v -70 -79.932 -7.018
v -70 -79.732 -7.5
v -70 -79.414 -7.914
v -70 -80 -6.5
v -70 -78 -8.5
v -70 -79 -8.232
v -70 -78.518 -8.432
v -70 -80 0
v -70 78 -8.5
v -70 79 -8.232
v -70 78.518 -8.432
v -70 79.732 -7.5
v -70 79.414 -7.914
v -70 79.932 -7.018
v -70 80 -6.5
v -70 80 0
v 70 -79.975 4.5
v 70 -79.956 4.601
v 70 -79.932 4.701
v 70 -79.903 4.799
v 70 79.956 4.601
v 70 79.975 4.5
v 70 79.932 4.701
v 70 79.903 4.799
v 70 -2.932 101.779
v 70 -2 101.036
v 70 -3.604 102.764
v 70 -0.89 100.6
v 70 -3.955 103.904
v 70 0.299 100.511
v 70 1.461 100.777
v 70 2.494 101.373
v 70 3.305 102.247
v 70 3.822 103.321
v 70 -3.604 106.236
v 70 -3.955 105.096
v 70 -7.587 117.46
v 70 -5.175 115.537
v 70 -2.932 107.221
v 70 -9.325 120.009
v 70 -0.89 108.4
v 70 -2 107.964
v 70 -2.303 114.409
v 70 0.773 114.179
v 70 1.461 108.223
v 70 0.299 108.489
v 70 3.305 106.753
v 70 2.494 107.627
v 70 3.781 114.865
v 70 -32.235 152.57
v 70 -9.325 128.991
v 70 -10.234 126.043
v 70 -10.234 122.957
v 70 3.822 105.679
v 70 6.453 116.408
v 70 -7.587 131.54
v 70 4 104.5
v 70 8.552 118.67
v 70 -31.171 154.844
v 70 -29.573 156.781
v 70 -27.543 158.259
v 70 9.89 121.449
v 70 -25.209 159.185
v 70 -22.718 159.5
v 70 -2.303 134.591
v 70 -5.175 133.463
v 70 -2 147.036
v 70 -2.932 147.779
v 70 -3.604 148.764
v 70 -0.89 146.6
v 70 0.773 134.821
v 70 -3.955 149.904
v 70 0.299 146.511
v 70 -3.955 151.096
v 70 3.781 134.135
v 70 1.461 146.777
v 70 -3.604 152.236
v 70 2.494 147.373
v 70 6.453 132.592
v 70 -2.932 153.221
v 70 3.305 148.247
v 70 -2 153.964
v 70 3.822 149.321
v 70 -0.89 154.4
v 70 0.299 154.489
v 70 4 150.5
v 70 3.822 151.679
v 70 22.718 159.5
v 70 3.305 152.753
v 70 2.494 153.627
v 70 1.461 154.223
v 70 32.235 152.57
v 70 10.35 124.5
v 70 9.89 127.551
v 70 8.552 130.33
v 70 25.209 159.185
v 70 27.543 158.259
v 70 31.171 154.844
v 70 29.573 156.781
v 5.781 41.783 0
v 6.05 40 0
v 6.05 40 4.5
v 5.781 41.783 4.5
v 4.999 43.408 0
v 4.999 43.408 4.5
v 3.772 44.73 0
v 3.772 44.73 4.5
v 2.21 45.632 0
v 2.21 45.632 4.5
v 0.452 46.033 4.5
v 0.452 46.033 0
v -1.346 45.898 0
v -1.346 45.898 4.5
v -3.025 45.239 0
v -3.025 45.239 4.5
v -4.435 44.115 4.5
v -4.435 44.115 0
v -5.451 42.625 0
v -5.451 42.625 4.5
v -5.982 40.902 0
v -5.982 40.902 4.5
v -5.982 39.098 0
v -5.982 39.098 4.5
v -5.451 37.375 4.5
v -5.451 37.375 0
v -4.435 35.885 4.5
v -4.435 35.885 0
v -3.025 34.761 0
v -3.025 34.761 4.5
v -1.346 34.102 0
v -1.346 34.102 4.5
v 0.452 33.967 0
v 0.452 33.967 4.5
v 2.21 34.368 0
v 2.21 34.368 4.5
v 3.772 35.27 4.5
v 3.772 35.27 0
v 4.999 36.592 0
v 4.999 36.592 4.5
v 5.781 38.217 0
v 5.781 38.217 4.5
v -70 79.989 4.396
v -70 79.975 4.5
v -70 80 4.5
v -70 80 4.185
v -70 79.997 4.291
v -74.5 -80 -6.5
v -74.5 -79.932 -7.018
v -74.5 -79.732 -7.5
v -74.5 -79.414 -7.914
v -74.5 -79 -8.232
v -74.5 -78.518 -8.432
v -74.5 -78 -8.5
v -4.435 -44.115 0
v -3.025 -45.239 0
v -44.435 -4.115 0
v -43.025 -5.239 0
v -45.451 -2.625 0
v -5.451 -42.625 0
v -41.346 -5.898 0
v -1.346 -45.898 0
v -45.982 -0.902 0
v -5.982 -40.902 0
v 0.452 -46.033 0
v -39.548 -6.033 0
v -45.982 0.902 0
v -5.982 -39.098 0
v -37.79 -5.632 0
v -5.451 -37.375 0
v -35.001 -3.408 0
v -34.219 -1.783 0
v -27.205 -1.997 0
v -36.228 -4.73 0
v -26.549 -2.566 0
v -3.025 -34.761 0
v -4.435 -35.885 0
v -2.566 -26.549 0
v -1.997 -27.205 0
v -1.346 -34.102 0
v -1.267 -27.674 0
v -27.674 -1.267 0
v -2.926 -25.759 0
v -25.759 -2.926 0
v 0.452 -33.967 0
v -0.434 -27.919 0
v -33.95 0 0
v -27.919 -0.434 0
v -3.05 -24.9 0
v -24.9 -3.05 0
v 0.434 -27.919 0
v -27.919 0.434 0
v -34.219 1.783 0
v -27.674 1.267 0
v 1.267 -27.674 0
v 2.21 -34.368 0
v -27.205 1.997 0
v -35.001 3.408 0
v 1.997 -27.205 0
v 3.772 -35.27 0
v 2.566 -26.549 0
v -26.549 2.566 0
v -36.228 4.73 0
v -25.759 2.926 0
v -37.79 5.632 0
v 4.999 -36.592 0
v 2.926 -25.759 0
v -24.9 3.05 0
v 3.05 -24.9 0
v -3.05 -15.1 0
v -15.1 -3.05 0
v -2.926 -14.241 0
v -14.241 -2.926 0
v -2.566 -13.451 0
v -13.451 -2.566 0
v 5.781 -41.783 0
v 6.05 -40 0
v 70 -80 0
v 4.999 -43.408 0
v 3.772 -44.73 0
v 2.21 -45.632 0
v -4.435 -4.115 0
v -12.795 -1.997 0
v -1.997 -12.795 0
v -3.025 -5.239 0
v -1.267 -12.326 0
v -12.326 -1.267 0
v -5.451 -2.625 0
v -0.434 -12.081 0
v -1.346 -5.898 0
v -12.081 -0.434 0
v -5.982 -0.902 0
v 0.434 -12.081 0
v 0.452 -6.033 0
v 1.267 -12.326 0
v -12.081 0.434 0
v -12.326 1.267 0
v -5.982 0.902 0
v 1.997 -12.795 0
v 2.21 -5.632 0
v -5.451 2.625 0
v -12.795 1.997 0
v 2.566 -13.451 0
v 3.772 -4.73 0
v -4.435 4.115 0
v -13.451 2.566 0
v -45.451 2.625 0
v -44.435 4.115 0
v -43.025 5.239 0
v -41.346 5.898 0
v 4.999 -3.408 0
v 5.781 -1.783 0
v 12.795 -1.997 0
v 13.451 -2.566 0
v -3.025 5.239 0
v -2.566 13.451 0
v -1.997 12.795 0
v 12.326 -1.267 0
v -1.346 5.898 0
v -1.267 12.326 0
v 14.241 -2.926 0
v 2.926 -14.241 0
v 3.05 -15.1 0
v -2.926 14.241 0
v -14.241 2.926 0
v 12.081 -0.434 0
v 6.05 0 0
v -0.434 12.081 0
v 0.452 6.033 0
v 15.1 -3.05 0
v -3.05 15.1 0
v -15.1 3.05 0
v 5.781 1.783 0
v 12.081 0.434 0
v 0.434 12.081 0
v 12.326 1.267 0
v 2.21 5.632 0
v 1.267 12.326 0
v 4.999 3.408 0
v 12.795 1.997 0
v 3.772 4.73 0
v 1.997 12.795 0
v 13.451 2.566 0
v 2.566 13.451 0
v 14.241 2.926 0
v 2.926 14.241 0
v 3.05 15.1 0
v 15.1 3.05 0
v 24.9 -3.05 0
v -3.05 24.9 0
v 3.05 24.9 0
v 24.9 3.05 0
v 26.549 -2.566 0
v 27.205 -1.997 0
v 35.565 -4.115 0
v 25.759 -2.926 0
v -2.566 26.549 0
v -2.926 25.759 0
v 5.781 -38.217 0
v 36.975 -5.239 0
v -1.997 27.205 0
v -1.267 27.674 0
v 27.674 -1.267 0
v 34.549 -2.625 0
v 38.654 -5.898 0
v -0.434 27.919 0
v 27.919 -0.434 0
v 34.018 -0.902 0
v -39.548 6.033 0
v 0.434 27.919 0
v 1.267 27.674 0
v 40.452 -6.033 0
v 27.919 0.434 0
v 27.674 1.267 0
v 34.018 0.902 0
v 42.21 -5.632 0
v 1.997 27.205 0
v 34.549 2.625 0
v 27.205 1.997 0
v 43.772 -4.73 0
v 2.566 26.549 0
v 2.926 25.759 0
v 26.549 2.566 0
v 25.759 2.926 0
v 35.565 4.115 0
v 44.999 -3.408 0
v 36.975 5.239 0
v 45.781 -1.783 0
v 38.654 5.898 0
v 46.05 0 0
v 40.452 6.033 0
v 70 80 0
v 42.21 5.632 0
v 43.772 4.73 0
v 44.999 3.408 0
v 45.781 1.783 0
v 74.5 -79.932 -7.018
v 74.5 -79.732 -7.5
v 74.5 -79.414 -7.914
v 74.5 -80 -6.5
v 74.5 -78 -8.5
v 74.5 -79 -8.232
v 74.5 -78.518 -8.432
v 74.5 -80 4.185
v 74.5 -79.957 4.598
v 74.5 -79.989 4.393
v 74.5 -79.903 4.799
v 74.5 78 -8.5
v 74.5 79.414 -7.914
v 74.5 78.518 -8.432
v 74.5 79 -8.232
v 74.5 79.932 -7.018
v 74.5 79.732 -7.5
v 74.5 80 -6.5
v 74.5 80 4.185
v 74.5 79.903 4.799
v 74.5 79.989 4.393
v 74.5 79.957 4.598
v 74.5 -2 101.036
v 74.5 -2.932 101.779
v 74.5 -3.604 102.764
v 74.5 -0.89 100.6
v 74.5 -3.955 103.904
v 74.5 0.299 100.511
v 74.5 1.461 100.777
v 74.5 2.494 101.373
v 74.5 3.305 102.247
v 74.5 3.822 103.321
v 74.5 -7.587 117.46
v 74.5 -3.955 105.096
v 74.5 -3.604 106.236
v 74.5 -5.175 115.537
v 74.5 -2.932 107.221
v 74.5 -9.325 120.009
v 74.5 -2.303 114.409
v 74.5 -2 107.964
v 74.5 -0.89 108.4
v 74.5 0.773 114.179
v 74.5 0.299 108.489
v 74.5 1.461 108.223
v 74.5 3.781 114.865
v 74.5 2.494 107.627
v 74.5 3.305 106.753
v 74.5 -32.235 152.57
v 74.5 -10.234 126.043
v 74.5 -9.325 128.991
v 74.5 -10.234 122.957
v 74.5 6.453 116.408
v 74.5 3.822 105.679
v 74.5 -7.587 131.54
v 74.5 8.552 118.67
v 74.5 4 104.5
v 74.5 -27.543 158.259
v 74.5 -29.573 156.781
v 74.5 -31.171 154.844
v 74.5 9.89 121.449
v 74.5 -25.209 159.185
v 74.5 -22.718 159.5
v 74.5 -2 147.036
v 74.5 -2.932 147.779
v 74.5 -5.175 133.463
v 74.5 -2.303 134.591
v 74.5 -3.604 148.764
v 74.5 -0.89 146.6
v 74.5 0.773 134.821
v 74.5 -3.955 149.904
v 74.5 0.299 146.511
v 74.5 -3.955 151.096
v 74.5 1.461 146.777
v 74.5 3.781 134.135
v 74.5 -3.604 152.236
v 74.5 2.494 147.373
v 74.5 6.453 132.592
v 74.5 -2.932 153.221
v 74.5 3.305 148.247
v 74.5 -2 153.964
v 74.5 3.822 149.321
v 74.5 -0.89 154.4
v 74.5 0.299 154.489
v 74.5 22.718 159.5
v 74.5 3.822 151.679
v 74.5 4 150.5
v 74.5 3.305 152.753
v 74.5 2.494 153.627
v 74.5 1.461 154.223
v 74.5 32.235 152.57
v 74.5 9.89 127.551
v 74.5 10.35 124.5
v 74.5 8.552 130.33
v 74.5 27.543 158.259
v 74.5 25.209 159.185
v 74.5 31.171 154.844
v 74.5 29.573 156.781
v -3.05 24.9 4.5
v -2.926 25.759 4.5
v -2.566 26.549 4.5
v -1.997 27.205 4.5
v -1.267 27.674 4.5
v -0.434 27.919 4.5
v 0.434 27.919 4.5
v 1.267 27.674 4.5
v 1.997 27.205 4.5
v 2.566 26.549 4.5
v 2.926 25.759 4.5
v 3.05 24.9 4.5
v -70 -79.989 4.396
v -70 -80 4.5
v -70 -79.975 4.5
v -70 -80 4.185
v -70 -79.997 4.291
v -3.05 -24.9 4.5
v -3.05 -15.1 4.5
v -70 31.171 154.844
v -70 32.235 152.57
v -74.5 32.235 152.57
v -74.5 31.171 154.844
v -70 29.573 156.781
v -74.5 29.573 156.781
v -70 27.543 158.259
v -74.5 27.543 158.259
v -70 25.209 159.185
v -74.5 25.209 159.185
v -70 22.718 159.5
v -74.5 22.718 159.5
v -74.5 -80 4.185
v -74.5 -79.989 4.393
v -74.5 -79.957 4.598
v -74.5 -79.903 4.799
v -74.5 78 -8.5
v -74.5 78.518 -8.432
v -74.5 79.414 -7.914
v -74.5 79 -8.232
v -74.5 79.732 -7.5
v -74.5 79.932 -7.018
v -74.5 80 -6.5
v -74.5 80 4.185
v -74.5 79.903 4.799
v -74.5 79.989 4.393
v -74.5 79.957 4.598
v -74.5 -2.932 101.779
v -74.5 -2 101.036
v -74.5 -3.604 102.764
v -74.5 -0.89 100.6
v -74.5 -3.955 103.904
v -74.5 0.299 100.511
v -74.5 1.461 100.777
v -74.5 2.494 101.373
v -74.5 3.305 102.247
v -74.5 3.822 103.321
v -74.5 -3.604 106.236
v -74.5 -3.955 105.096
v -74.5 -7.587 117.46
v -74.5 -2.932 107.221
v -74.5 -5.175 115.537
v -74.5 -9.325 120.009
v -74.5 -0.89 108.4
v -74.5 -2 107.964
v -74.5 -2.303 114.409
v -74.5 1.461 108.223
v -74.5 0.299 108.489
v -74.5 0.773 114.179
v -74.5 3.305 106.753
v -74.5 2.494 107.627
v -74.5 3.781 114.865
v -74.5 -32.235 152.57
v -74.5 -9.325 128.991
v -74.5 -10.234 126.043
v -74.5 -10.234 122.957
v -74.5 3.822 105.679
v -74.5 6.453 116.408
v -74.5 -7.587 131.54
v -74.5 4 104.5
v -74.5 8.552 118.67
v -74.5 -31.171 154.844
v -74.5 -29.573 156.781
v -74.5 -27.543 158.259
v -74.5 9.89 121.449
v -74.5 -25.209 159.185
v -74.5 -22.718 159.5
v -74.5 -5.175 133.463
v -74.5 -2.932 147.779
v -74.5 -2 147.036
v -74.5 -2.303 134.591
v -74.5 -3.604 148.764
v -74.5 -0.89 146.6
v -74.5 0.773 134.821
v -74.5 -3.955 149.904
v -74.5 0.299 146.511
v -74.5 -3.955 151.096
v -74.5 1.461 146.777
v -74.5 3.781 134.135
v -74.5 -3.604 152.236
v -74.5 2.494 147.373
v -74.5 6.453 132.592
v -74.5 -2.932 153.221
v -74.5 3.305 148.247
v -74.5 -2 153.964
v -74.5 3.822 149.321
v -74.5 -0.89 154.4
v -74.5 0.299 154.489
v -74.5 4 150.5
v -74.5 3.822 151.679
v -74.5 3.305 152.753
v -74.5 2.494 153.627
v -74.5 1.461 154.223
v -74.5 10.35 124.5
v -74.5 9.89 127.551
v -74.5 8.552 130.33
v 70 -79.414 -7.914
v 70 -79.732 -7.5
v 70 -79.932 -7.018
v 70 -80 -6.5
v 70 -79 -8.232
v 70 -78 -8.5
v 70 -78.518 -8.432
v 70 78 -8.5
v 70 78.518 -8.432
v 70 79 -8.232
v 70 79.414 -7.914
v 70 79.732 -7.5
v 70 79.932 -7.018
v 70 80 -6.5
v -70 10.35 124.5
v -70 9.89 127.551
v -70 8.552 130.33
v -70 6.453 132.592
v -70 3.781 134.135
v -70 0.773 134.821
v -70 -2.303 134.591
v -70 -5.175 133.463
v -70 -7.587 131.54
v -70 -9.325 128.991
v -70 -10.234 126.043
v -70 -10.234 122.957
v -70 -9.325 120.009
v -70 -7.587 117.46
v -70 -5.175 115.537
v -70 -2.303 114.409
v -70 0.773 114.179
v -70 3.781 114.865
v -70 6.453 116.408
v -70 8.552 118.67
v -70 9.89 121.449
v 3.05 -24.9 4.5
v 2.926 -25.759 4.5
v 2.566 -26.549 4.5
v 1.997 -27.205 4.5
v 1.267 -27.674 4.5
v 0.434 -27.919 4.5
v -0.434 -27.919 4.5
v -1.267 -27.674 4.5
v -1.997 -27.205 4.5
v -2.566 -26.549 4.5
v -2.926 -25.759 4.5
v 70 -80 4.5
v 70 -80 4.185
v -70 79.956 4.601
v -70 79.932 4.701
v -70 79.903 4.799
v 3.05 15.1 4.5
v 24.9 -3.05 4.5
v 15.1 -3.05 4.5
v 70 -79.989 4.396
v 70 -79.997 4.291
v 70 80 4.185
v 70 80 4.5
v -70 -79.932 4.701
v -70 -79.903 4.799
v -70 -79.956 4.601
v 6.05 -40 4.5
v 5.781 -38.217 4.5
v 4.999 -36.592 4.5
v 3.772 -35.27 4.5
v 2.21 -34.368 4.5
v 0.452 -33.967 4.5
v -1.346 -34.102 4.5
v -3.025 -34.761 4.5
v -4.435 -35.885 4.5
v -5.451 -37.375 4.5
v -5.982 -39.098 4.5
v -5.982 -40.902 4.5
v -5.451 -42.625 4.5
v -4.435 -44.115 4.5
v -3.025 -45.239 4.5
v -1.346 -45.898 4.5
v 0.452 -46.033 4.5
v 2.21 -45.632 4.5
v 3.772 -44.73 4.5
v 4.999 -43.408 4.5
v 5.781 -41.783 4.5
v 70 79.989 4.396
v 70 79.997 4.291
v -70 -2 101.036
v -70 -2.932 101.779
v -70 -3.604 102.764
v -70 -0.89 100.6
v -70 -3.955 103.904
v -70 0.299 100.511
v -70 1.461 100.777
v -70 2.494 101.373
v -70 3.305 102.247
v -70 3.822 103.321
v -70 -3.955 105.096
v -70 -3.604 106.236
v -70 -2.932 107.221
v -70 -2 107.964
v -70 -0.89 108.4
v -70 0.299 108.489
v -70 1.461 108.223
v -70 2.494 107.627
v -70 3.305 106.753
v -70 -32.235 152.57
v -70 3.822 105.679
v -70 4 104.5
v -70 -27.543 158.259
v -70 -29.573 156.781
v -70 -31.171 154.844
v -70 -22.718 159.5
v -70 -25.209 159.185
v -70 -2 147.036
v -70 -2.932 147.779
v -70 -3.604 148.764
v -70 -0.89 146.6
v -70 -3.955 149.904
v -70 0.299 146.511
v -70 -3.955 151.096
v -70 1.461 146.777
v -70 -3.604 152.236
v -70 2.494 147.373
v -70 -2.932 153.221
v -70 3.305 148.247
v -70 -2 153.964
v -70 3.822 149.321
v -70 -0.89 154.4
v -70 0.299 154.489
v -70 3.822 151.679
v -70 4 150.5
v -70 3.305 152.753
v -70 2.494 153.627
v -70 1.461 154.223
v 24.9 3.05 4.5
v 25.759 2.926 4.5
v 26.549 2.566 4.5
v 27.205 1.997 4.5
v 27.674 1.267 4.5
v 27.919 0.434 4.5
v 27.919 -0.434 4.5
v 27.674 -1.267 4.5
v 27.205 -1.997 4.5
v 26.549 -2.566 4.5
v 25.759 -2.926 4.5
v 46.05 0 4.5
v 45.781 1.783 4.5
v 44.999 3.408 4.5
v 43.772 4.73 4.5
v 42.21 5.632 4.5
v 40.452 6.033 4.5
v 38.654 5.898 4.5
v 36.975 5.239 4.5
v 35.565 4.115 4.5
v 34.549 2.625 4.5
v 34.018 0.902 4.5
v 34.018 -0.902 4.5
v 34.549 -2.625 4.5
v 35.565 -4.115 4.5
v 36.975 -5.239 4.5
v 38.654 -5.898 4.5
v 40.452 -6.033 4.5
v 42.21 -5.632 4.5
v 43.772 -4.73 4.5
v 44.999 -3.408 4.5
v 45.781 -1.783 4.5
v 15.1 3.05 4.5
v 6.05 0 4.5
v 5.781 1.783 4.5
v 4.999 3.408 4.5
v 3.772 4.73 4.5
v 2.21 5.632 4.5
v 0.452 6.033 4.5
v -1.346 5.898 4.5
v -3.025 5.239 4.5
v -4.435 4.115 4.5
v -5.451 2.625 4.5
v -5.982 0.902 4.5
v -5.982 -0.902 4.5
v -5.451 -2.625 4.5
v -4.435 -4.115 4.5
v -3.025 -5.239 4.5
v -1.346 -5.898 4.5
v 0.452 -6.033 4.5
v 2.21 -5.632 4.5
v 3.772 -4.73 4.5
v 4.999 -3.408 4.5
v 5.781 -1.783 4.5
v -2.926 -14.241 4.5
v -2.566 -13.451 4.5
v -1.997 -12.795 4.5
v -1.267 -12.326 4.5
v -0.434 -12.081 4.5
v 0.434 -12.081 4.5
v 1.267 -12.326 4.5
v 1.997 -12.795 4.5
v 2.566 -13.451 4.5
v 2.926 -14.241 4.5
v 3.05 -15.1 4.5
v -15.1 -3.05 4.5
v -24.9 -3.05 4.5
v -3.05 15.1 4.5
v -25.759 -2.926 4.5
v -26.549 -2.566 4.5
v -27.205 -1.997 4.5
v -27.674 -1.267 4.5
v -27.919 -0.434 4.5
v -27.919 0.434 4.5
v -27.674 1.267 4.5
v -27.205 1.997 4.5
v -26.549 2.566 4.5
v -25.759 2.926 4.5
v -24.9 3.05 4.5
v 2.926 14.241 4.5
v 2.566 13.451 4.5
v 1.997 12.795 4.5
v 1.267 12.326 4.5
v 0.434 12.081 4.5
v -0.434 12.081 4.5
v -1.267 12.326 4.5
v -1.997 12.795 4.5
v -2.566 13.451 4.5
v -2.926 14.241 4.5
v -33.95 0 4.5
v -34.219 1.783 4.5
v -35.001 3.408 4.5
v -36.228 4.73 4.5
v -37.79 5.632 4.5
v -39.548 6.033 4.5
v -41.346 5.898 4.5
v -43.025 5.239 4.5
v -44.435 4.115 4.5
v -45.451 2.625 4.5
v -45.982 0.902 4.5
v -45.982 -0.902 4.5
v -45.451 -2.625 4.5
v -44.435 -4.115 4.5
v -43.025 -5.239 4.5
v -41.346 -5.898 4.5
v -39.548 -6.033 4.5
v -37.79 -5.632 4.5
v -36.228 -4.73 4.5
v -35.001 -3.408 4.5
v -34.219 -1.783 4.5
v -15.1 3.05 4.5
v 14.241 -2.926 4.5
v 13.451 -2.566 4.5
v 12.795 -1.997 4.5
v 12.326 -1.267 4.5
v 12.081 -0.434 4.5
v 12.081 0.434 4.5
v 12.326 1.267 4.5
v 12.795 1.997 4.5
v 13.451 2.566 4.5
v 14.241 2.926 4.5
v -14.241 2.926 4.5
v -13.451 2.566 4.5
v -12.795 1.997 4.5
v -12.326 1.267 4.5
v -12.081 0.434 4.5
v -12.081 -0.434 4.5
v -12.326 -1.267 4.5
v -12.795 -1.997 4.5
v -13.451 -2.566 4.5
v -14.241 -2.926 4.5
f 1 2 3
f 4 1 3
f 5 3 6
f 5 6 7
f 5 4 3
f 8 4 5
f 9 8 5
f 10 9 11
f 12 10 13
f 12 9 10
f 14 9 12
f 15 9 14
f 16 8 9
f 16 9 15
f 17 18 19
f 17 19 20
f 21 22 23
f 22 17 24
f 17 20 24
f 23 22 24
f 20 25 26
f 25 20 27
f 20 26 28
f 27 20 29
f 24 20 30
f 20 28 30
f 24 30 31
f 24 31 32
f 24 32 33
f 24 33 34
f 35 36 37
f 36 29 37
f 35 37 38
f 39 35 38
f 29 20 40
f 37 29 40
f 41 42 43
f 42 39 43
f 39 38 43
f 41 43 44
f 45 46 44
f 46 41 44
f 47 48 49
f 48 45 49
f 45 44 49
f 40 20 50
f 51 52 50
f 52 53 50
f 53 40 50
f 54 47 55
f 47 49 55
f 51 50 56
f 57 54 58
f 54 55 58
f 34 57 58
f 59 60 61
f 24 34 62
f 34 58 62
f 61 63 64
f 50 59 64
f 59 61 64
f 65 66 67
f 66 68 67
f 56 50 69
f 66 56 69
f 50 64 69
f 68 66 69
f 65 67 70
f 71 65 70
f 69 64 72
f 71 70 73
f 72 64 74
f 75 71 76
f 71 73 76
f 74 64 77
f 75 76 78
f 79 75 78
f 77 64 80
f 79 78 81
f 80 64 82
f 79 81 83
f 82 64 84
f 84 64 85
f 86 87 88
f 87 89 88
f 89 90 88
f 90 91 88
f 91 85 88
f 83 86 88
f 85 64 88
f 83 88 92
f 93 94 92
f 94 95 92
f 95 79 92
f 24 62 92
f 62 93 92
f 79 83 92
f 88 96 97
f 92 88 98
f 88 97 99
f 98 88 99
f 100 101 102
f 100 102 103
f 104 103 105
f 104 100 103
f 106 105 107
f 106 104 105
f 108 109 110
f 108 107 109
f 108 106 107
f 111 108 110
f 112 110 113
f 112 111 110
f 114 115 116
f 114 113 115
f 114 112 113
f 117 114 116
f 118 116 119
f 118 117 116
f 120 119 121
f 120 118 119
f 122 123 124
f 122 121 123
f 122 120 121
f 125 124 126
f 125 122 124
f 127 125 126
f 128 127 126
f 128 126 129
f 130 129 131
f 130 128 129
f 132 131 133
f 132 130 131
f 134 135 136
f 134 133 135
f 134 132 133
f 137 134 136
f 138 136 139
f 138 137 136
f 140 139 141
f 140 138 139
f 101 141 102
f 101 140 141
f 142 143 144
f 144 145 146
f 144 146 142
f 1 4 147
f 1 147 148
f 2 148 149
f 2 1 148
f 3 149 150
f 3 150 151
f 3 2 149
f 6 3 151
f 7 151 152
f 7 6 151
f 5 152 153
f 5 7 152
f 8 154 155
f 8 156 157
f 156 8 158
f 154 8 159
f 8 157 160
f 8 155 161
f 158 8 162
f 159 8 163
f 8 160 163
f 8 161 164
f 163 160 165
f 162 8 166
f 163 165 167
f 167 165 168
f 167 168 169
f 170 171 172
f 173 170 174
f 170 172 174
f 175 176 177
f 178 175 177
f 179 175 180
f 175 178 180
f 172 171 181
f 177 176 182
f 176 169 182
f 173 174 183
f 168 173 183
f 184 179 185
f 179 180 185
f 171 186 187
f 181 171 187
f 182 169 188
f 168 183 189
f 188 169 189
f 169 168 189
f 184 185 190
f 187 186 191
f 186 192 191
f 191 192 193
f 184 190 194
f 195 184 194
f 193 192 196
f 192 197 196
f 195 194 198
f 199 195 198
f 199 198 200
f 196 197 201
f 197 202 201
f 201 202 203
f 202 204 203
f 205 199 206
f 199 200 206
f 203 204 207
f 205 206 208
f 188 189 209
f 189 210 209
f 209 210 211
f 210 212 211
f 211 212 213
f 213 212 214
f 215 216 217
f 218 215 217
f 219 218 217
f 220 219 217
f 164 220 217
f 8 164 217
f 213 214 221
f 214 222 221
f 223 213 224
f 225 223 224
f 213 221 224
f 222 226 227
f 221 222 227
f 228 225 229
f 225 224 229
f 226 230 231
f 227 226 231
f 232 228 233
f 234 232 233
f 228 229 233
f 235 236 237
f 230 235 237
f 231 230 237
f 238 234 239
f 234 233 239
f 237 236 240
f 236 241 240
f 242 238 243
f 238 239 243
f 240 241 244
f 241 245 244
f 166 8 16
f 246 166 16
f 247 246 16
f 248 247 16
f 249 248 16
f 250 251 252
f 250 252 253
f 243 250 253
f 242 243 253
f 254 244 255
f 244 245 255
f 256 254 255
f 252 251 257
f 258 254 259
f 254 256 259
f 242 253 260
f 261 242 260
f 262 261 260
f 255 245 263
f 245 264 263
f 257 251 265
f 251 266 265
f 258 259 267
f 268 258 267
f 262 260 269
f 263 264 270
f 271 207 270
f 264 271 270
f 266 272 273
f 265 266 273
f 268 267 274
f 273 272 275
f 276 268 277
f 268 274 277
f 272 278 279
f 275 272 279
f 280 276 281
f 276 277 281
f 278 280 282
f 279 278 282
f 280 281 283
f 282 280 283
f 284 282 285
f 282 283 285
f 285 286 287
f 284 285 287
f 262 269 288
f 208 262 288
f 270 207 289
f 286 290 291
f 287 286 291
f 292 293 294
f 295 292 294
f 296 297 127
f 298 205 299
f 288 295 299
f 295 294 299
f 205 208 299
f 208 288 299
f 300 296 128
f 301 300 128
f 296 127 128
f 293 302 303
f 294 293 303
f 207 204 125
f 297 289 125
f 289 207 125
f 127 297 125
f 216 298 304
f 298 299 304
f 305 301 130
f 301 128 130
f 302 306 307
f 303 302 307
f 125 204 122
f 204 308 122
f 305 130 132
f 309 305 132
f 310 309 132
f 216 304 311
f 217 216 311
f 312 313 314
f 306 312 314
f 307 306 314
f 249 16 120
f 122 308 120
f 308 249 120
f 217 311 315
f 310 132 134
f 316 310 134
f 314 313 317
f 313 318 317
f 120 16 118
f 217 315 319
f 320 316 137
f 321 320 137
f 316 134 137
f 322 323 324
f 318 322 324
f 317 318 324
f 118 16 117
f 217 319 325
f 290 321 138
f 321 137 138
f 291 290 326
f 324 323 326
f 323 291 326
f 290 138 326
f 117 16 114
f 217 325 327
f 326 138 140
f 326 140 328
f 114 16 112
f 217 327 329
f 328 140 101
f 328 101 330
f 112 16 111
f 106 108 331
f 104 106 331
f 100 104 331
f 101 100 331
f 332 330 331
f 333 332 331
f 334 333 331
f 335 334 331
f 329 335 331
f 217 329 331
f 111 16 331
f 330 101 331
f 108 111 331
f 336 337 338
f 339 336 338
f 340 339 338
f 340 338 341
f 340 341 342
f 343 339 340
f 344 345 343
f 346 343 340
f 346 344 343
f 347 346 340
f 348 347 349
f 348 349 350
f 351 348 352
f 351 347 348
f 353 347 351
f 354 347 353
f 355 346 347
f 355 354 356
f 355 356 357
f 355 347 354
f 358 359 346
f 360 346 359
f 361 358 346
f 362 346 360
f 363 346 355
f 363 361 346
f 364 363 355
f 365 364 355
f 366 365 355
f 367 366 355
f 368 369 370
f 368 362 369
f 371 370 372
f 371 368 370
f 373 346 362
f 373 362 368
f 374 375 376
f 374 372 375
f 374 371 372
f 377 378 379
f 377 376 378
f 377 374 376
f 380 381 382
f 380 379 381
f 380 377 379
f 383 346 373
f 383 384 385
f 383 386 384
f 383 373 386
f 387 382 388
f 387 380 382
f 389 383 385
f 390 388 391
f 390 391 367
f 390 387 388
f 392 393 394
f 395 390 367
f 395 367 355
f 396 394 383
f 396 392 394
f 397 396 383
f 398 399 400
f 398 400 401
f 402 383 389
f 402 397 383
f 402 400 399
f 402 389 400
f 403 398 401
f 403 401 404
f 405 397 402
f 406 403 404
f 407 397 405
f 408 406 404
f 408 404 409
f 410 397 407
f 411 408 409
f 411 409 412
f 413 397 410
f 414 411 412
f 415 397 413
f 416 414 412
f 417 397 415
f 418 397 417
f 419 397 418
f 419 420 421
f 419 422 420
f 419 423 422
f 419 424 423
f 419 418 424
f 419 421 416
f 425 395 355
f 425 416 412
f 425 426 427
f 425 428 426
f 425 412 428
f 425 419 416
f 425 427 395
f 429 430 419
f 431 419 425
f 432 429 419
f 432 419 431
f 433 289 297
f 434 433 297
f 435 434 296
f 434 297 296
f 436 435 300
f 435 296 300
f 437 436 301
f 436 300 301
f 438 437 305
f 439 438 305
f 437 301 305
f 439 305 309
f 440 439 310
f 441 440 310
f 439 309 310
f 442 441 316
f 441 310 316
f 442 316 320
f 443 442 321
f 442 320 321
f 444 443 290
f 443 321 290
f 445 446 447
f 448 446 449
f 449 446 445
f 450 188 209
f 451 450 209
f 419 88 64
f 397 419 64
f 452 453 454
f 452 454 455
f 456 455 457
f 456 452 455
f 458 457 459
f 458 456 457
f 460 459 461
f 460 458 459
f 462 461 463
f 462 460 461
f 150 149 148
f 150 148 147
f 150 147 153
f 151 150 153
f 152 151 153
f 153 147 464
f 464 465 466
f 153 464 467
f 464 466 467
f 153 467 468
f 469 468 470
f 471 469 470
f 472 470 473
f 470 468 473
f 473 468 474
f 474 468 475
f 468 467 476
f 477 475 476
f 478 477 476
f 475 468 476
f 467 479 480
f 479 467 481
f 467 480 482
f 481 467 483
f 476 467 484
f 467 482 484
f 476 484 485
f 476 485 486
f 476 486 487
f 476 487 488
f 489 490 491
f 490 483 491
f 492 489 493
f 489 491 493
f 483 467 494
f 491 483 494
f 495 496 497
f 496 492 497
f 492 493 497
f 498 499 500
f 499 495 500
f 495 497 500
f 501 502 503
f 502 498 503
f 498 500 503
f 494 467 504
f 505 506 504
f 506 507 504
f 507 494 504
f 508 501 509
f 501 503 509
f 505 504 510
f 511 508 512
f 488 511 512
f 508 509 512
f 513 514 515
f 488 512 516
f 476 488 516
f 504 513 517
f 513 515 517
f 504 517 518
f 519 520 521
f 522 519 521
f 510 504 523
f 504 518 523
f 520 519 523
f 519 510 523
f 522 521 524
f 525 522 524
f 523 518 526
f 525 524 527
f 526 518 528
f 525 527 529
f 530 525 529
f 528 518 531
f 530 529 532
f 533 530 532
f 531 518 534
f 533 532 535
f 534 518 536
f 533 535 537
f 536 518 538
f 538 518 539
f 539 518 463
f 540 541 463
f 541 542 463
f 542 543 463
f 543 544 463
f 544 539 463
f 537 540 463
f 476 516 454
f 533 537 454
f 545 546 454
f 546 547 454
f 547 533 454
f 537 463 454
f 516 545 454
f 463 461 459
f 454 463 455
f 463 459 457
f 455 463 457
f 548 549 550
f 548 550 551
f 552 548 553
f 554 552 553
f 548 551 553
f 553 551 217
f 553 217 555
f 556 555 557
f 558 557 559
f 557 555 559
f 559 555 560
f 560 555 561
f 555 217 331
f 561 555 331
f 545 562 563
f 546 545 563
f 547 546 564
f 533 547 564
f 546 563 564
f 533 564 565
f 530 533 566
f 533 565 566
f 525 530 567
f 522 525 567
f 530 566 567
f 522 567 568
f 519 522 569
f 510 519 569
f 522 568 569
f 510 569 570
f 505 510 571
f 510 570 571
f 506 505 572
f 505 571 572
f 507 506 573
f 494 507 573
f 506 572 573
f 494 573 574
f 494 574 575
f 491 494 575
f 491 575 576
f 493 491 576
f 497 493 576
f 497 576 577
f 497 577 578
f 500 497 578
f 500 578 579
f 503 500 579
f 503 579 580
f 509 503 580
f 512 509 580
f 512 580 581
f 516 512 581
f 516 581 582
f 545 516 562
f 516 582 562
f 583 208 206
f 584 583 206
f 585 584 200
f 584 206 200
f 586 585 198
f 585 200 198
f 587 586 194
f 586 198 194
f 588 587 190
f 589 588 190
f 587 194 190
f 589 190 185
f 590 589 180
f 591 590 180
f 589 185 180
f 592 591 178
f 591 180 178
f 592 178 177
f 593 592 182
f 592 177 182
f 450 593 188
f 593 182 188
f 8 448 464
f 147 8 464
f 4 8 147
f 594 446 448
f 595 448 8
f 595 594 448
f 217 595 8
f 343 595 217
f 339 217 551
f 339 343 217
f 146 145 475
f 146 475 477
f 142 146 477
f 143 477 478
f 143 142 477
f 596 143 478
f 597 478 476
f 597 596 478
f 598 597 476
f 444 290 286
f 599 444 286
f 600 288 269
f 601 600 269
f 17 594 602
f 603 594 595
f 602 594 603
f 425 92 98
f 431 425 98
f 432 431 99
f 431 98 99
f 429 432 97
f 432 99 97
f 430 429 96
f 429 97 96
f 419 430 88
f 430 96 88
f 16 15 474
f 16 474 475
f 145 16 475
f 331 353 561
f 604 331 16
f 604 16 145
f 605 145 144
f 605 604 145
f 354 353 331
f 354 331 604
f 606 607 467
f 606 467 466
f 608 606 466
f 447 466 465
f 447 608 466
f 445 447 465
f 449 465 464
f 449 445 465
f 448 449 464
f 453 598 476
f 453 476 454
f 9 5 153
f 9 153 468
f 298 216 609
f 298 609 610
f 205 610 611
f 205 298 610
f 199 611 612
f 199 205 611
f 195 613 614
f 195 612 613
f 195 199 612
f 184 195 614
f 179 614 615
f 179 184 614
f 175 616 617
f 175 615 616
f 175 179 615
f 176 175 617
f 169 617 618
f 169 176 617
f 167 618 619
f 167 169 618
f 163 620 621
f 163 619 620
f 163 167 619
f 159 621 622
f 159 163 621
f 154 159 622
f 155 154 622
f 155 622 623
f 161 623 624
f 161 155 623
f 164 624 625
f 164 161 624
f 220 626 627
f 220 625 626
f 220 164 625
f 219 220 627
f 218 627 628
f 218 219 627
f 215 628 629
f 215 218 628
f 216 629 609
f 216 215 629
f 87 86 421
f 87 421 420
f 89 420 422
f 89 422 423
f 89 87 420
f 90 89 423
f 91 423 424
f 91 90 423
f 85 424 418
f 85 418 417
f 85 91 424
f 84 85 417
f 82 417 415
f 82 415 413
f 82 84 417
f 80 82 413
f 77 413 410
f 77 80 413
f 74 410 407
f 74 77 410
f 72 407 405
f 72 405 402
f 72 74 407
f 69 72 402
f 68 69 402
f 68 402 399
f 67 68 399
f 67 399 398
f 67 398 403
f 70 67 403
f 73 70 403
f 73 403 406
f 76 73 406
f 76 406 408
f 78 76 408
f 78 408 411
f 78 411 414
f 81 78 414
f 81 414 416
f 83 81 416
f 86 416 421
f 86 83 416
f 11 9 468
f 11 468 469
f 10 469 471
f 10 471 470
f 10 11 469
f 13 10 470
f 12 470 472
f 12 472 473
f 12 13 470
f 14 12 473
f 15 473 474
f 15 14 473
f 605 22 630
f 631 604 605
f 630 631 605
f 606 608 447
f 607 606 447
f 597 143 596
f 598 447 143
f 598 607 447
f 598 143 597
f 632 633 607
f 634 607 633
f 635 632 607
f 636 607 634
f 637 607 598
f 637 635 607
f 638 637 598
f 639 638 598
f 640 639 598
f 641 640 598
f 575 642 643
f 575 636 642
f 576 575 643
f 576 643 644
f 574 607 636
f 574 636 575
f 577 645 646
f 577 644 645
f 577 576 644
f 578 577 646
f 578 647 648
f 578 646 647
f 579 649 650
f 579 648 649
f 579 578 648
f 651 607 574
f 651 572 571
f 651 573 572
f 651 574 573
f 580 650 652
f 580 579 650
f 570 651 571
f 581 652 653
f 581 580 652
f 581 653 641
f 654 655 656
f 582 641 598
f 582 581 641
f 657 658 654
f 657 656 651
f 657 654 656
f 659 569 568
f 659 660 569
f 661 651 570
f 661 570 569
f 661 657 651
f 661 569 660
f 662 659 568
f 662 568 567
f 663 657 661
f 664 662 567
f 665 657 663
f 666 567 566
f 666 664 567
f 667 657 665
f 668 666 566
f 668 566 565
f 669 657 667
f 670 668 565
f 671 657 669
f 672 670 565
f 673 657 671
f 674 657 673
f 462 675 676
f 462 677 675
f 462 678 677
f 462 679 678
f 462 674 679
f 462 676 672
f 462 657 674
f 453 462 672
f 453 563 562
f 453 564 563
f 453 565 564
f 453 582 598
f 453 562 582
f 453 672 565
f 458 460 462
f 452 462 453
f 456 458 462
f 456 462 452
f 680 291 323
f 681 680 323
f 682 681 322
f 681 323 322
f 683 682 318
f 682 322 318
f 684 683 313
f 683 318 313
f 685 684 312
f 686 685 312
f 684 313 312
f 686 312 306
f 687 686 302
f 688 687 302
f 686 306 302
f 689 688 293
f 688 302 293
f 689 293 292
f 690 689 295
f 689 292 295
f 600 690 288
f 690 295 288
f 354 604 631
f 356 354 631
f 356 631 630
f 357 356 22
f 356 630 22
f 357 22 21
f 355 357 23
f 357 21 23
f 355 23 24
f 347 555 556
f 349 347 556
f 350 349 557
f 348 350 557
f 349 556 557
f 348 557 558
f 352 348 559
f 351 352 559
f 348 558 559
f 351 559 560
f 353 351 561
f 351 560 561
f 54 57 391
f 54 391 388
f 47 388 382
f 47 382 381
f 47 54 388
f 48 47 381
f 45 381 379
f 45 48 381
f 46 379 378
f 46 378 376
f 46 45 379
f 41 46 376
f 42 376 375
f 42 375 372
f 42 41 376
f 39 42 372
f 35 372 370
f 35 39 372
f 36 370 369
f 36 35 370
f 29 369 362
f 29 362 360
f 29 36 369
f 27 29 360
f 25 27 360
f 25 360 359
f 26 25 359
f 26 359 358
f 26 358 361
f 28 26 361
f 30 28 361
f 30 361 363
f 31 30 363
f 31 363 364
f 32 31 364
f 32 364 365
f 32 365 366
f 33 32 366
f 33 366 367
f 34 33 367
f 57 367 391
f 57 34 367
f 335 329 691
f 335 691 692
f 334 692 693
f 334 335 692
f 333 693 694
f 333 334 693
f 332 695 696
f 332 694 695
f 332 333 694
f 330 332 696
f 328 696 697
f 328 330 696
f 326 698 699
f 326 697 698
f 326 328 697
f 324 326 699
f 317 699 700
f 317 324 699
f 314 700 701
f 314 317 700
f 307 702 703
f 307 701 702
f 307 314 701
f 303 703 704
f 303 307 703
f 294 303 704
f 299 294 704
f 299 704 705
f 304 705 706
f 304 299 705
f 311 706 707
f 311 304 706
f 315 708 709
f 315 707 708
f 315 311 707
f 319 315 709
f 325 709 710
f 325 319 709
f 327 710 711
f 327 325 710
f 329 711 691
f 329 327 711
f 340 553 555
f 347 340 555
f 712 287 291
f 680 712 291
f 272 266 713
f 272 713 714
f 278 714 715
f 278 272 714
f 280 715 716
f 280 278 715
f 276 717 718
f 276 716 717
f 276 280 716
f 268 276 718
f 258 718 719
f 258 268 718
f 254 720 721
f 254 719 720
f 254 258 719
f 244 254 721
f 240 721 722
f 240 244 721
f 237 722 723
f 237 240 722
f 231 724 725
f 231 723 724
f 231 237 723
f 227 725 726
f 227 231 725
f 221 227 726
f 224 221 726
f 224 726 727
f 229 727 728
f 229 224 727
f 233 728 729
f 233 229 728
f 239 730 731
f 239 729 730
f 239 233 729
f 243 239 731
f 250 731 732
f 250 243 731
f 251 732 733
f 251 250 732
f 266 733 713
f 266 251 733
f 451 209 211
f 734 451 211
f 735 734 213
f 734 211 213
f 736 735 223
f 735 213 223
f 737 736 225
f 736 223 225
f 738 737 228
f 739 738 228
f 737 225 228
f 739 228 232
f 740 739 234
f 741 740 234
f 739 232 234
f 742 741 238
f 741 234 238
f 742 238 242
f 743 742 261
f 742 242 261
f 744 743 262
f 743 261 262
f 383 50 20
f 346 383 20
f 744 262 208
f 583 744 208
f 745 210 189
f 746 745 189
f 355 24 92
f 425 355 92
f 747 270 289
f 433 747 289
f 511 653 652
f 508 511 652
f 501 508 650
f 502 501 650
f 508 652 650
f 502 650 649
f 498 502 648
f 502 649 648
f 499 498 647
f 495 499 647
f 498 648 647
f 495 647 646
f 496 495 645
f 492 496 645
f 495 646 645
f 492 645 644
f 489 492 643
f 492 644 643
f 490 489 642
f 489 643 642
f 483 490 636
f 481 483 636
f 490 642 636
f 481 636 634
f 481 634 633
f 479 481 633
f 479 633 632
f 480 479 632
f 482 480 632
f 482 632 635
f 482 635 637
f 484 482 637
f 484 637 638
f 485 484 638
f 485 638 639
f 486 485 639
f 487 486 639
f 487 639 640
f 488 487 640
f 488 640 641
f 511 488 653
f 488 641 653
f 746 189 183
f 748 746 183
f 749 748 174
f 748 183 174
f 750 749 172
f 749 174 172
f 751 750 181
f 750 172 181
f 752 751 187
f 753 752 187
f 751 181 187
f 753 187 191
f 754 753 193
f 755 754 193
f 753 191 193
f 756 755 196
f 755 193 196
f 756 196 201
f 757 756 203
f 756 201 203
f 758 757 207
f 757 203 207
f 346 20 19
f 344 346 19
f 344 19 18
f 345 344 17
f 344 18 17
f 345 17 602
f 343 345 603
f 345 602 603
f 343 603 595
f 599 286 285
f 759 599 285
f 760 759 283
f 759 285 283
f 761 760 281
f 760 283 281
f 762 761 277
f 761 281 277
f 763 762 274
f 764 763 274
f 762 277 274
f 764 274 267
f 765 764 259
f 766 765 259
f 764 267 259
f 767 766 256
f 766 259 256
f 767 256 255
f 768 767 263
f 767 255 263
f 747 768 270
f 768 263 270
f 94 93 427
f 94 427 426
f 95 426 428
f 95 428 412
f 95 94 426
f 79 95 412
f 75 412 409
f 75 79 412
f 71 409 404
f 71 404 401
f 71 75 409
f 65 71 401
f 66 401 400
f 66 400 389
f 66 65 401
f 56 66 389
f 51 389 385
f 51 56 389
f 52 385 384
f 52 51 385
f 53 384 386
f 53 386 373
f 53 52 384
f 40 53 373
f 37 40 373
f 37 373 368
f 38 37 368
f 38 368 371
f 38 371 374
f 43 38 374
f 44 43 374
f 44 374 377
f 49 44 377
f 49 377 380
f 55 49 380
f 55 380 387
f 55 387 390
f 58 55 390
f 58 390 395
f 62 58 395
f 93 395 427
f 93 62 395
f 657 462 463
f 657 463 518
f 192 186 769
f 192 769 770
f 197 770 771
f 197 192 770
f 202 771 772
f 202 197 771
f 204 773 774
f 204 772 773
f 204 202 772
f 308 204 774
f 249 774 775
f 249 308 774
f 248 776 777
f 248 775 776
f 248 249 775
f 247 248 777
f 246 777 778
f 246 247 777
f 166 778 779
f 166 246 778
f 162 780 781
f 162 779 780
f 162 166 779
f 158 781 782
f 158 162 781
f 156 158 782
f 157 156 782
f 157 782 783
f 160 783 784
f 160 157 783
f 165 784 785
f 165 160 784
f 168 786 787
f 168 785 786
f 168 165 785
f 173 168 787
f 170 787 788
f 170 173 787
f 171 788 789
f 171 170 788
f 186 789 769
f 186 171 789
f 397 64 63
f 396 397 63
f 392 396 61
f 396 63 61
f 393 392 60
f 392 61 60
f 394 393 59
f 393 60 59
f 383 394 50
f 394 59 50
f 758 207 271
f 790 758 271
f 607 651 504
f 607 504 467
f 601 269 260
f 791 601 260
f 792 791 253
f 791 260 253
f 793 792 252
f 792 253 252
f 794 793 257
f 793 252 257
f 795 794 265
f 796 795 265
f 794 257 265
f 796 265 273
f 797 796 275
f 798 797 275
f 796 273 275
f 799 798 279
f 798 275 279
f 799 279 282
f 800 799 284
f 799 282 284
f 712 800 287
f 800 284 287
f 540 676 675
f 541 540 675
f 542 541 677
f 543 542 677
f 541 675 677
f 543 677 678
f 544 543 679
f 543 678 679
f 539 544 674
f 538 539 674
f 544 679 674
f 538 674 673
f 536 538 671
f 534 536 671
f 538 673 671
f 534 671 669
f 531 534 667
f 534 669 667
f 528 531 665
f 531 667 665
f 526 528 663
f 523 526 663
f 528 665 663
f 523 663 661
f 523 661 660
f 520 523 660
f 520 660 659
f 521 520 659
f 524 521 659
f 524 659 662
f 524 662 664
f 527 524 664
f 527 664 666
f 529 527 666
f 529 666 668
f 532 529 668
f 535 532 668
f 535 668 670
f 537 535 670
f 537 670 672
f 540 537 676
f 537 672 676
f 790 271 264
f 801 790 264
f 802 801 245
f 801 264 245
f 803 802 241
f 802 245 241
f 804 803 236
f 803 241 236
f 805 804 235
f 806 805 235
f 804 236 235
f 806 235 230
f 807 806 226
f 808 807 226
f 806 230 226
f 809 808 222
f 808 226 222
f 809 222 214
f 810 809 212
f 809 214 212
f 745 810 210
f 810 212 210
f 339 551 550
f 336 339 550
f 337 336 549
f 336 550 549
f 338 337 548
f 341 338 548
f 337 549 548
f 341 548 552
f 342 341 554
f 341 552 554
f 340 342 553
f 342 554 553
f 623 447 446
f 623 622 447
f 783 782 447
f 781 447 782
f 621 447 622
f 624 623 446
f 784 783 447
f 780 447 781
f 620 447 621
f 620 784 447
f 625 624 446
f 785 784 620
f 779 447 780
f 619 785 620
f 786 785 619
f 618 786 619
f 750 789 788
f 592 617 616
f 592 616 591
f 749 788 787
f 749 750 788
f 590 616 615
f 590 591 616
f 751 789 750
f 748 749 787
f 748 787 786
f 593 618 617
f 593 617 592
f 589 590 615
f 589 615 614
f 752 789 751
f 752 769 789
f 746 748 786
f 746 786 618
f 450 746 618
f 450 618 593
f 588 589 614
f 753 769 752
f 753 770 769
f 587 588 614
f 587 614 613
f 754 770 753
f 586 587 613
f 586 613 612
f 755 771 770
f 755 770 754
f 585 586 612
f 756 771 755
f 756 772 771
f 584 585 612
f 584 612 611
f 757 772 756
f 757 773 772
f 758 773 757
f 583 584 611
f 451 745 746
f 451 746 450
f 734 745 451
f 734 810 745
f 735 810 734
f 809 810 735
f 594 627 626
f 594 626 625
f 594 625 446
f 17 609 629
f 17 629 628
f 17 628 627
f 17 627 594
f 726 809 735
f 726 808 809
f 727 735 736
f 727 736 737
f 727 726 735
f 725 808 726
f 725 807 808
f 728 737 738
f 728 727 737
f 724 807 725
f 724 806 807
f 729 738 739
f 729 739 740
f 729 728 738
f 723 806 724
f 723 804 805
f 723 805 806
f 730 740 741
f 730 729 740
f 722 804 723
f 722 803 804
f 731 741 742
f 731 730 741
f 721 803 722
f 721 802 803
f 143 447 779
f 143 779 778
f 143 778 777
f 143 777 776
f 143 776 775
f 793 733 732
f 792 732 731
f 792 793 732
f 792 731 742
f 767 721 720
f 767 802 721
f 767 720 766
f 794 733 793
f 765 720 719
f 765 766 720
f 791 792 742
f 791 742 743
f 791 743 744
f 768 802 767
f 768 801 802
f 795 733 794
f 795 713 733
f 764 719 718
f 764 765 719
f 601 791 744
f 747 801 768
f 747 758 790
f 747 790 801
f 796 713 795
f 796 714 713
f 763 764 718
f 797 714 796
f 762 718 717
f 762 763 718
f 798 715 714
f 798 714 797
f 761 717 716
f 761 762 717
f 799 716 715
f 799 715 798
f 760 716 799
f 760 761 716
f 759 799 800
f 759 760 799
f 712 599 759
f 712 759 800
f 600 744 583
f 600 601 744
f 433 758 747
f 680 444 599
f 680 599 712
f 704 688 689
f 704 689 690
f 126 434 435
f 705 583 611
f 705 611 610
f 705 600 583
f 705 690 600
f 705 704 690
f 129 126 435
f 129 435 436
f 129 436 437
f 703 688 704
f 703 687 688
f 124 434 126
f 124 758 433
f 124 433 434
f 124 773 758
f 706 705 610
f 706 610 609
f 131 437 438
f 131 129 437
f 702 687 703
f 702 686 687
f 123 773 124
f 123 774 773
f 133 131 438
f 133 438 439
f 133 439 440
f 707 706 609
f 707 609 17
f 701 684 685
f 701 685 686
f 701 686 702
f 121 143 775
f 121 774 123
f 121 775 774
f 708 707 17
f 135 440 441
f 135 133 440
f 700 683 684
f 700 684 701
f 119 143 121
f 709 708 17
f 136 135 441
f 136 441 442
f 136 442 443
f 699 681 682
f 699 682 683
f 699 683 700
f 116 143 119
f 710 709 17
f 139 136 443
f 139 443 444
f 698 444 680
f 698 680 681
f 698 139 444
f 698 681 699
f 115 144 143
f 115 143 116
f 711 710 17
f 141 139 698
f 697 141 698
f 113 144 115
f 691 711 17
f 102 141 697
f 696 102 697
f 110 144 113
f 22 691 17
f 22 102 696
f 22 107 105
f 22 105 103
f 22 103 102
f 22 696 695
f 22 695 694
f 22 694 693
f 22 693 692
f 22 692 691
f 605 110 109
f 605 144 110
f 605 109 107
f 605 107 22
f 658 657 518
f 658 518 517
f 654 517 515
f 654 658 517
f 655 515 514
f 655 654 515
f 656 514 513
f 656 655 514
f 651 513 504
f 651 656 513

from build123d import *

# Parameters (mm, degrees)
F0_W     = 140
F0_H     = 160
F0_R     = 6.05
F1_DEPTH = 4.5
F2_R     = 4
F2_R_2   = 10.35
F3_DEPTH = 4.5


with BuildPart() as f1:
    # F0 (on Top) → F1 (new body)
    with BuildSketch(Plane.XY):
        Rectangle(F0_W, F0_H)
        with Locations((0, -40)):
            Circle(F0_R, mode=Mode.SUBTRACT)
        with BuildLine():
            ThreePointArc((3.05, -24.9), (0, -27.95), (-3.05, -24.9))
            Line((-3.05, -24.9), (-3.05, -15.1))
            ThreePointArc((-3.05, -15.1), (0, -12.05), (3.05, -15.1))
            Line((3.05, -15.1), (3.05, -24.9))
        make_face(mode=Mode.SUBTRACT)
        with Locations((-40, 0)):
            Circle(F0_R, mode=Mode.SUBTRACT)
        with BuildLine():
            ThreePointArc((-24.9, -3.05), (-27.95, 0), (-24.9, 3.05))
            Line((-24.9, 3.05), (-15.1, 3.05))
            ThreePointArc((-15.1, 3.05), (-12.05, 0), (-15.1, -3.05))
            Line((-15.1, -3.05), (-24.9, -3.05))
        make_face(mode=Mode.SUBTRACT)
        Circle(F0_R, mode=Mode.SUBTRACT)
        with BuildLine():
            ThreePointArc((24.9, 3.05), (27.95, 0), (24.9, -3.05))
            Line((24.9, -3.05), (15.1, -3.05))
            ThreePointArc((15.1, -3.05), (12.05, 0), (15.1, 3.05))
            Line((15.1, 3.05), (24.9, 3.05))
        make_face(mode=Mode.SUBTRACT)
        with BuildLine():
            ThreePointArc((-3.05, 24.9), (0, 27.95), (3.05, 24.9))
            Line((3.05, 24.9), (3.05, 15.1))
            ThreePointArc((3.05, 15.1), (0, 12.05), (-3.05, 15.1))
            Line((-3.05, 15.1), (-3.05, 24.9))
        make_face(mode=Mode.SUBTRACT)
        with Locations((40, 0)):
            Circle(F0_R, mode=Mode.SUBTRACT)
        with Locations((0, 40)):
            Circle(F0_R, mode=Mode.SUBTRACT)
    extrude(amount=F1_DEPTH)

    # F2 (on face) → F3 (join)
    with BuildSketch(Plane.YZ.offset(70)):
        with BuildLine():
            Line((22.7183887259, 159.5), (-22.7183887259, 159.5))
            ThreePointArc((-22.7183887259, 159.5), (-28.6048019805, 157.5839432826), (-32.2354749035, 152.5700277992))
            Line((-32.2354749035, 152.5700277992), (-79.9034172355, 4.7994065699))
            ThreePointArc((-79.9034172355, 4.7994065699), (-79.9757067686, 4.496178687), (-80, 4.18540101))
            Line((-80, 4.18540101), (-80, -6.5))
            ThreePointArc((-80, -6.5), (-79.4142135624, -7.9142135624), (-78, -8.5))
            Line((-78, -8.5), (78, -8.5))
            ThreePointArc((78, -8.5), (79.4142135624, -7.9142135624), (80, -6.5))
            Line((80, -6.5), (80, 4.18540101))
            ThreePointArc((80, 4.18540101), (79.9757067686, 4.496178687), (79.9034172355, 4.7994065699))
            Line((79.9034172355, 4.7994065699), (32.2354749035, 152.5700277992))
            ThreePointArc((32.2354749035, 152.5700277992), (28.6048019805, 157.5839432826), (22.7183887259, 159.5))
        make_face()
        with Locations((0, 104.5)):
            Circle(F2_R, mode=Mode.SUBTRACT)
        with Locations((0, 124.5)):
            Circle(F2_R_2, mode=Mode.SUBTRACT)
        with Locations((0, 150.5)):
            Circle(F2_R, mode=Mode.SUBTRACT)
    extrude(amount=F3_DEPTH)

    # F4: F1 across plane


with BuildPart() as f1_1:
    add(f1.part)
    add(f1.part.mirror(Plane.YZ))


solid = f1_1.part
